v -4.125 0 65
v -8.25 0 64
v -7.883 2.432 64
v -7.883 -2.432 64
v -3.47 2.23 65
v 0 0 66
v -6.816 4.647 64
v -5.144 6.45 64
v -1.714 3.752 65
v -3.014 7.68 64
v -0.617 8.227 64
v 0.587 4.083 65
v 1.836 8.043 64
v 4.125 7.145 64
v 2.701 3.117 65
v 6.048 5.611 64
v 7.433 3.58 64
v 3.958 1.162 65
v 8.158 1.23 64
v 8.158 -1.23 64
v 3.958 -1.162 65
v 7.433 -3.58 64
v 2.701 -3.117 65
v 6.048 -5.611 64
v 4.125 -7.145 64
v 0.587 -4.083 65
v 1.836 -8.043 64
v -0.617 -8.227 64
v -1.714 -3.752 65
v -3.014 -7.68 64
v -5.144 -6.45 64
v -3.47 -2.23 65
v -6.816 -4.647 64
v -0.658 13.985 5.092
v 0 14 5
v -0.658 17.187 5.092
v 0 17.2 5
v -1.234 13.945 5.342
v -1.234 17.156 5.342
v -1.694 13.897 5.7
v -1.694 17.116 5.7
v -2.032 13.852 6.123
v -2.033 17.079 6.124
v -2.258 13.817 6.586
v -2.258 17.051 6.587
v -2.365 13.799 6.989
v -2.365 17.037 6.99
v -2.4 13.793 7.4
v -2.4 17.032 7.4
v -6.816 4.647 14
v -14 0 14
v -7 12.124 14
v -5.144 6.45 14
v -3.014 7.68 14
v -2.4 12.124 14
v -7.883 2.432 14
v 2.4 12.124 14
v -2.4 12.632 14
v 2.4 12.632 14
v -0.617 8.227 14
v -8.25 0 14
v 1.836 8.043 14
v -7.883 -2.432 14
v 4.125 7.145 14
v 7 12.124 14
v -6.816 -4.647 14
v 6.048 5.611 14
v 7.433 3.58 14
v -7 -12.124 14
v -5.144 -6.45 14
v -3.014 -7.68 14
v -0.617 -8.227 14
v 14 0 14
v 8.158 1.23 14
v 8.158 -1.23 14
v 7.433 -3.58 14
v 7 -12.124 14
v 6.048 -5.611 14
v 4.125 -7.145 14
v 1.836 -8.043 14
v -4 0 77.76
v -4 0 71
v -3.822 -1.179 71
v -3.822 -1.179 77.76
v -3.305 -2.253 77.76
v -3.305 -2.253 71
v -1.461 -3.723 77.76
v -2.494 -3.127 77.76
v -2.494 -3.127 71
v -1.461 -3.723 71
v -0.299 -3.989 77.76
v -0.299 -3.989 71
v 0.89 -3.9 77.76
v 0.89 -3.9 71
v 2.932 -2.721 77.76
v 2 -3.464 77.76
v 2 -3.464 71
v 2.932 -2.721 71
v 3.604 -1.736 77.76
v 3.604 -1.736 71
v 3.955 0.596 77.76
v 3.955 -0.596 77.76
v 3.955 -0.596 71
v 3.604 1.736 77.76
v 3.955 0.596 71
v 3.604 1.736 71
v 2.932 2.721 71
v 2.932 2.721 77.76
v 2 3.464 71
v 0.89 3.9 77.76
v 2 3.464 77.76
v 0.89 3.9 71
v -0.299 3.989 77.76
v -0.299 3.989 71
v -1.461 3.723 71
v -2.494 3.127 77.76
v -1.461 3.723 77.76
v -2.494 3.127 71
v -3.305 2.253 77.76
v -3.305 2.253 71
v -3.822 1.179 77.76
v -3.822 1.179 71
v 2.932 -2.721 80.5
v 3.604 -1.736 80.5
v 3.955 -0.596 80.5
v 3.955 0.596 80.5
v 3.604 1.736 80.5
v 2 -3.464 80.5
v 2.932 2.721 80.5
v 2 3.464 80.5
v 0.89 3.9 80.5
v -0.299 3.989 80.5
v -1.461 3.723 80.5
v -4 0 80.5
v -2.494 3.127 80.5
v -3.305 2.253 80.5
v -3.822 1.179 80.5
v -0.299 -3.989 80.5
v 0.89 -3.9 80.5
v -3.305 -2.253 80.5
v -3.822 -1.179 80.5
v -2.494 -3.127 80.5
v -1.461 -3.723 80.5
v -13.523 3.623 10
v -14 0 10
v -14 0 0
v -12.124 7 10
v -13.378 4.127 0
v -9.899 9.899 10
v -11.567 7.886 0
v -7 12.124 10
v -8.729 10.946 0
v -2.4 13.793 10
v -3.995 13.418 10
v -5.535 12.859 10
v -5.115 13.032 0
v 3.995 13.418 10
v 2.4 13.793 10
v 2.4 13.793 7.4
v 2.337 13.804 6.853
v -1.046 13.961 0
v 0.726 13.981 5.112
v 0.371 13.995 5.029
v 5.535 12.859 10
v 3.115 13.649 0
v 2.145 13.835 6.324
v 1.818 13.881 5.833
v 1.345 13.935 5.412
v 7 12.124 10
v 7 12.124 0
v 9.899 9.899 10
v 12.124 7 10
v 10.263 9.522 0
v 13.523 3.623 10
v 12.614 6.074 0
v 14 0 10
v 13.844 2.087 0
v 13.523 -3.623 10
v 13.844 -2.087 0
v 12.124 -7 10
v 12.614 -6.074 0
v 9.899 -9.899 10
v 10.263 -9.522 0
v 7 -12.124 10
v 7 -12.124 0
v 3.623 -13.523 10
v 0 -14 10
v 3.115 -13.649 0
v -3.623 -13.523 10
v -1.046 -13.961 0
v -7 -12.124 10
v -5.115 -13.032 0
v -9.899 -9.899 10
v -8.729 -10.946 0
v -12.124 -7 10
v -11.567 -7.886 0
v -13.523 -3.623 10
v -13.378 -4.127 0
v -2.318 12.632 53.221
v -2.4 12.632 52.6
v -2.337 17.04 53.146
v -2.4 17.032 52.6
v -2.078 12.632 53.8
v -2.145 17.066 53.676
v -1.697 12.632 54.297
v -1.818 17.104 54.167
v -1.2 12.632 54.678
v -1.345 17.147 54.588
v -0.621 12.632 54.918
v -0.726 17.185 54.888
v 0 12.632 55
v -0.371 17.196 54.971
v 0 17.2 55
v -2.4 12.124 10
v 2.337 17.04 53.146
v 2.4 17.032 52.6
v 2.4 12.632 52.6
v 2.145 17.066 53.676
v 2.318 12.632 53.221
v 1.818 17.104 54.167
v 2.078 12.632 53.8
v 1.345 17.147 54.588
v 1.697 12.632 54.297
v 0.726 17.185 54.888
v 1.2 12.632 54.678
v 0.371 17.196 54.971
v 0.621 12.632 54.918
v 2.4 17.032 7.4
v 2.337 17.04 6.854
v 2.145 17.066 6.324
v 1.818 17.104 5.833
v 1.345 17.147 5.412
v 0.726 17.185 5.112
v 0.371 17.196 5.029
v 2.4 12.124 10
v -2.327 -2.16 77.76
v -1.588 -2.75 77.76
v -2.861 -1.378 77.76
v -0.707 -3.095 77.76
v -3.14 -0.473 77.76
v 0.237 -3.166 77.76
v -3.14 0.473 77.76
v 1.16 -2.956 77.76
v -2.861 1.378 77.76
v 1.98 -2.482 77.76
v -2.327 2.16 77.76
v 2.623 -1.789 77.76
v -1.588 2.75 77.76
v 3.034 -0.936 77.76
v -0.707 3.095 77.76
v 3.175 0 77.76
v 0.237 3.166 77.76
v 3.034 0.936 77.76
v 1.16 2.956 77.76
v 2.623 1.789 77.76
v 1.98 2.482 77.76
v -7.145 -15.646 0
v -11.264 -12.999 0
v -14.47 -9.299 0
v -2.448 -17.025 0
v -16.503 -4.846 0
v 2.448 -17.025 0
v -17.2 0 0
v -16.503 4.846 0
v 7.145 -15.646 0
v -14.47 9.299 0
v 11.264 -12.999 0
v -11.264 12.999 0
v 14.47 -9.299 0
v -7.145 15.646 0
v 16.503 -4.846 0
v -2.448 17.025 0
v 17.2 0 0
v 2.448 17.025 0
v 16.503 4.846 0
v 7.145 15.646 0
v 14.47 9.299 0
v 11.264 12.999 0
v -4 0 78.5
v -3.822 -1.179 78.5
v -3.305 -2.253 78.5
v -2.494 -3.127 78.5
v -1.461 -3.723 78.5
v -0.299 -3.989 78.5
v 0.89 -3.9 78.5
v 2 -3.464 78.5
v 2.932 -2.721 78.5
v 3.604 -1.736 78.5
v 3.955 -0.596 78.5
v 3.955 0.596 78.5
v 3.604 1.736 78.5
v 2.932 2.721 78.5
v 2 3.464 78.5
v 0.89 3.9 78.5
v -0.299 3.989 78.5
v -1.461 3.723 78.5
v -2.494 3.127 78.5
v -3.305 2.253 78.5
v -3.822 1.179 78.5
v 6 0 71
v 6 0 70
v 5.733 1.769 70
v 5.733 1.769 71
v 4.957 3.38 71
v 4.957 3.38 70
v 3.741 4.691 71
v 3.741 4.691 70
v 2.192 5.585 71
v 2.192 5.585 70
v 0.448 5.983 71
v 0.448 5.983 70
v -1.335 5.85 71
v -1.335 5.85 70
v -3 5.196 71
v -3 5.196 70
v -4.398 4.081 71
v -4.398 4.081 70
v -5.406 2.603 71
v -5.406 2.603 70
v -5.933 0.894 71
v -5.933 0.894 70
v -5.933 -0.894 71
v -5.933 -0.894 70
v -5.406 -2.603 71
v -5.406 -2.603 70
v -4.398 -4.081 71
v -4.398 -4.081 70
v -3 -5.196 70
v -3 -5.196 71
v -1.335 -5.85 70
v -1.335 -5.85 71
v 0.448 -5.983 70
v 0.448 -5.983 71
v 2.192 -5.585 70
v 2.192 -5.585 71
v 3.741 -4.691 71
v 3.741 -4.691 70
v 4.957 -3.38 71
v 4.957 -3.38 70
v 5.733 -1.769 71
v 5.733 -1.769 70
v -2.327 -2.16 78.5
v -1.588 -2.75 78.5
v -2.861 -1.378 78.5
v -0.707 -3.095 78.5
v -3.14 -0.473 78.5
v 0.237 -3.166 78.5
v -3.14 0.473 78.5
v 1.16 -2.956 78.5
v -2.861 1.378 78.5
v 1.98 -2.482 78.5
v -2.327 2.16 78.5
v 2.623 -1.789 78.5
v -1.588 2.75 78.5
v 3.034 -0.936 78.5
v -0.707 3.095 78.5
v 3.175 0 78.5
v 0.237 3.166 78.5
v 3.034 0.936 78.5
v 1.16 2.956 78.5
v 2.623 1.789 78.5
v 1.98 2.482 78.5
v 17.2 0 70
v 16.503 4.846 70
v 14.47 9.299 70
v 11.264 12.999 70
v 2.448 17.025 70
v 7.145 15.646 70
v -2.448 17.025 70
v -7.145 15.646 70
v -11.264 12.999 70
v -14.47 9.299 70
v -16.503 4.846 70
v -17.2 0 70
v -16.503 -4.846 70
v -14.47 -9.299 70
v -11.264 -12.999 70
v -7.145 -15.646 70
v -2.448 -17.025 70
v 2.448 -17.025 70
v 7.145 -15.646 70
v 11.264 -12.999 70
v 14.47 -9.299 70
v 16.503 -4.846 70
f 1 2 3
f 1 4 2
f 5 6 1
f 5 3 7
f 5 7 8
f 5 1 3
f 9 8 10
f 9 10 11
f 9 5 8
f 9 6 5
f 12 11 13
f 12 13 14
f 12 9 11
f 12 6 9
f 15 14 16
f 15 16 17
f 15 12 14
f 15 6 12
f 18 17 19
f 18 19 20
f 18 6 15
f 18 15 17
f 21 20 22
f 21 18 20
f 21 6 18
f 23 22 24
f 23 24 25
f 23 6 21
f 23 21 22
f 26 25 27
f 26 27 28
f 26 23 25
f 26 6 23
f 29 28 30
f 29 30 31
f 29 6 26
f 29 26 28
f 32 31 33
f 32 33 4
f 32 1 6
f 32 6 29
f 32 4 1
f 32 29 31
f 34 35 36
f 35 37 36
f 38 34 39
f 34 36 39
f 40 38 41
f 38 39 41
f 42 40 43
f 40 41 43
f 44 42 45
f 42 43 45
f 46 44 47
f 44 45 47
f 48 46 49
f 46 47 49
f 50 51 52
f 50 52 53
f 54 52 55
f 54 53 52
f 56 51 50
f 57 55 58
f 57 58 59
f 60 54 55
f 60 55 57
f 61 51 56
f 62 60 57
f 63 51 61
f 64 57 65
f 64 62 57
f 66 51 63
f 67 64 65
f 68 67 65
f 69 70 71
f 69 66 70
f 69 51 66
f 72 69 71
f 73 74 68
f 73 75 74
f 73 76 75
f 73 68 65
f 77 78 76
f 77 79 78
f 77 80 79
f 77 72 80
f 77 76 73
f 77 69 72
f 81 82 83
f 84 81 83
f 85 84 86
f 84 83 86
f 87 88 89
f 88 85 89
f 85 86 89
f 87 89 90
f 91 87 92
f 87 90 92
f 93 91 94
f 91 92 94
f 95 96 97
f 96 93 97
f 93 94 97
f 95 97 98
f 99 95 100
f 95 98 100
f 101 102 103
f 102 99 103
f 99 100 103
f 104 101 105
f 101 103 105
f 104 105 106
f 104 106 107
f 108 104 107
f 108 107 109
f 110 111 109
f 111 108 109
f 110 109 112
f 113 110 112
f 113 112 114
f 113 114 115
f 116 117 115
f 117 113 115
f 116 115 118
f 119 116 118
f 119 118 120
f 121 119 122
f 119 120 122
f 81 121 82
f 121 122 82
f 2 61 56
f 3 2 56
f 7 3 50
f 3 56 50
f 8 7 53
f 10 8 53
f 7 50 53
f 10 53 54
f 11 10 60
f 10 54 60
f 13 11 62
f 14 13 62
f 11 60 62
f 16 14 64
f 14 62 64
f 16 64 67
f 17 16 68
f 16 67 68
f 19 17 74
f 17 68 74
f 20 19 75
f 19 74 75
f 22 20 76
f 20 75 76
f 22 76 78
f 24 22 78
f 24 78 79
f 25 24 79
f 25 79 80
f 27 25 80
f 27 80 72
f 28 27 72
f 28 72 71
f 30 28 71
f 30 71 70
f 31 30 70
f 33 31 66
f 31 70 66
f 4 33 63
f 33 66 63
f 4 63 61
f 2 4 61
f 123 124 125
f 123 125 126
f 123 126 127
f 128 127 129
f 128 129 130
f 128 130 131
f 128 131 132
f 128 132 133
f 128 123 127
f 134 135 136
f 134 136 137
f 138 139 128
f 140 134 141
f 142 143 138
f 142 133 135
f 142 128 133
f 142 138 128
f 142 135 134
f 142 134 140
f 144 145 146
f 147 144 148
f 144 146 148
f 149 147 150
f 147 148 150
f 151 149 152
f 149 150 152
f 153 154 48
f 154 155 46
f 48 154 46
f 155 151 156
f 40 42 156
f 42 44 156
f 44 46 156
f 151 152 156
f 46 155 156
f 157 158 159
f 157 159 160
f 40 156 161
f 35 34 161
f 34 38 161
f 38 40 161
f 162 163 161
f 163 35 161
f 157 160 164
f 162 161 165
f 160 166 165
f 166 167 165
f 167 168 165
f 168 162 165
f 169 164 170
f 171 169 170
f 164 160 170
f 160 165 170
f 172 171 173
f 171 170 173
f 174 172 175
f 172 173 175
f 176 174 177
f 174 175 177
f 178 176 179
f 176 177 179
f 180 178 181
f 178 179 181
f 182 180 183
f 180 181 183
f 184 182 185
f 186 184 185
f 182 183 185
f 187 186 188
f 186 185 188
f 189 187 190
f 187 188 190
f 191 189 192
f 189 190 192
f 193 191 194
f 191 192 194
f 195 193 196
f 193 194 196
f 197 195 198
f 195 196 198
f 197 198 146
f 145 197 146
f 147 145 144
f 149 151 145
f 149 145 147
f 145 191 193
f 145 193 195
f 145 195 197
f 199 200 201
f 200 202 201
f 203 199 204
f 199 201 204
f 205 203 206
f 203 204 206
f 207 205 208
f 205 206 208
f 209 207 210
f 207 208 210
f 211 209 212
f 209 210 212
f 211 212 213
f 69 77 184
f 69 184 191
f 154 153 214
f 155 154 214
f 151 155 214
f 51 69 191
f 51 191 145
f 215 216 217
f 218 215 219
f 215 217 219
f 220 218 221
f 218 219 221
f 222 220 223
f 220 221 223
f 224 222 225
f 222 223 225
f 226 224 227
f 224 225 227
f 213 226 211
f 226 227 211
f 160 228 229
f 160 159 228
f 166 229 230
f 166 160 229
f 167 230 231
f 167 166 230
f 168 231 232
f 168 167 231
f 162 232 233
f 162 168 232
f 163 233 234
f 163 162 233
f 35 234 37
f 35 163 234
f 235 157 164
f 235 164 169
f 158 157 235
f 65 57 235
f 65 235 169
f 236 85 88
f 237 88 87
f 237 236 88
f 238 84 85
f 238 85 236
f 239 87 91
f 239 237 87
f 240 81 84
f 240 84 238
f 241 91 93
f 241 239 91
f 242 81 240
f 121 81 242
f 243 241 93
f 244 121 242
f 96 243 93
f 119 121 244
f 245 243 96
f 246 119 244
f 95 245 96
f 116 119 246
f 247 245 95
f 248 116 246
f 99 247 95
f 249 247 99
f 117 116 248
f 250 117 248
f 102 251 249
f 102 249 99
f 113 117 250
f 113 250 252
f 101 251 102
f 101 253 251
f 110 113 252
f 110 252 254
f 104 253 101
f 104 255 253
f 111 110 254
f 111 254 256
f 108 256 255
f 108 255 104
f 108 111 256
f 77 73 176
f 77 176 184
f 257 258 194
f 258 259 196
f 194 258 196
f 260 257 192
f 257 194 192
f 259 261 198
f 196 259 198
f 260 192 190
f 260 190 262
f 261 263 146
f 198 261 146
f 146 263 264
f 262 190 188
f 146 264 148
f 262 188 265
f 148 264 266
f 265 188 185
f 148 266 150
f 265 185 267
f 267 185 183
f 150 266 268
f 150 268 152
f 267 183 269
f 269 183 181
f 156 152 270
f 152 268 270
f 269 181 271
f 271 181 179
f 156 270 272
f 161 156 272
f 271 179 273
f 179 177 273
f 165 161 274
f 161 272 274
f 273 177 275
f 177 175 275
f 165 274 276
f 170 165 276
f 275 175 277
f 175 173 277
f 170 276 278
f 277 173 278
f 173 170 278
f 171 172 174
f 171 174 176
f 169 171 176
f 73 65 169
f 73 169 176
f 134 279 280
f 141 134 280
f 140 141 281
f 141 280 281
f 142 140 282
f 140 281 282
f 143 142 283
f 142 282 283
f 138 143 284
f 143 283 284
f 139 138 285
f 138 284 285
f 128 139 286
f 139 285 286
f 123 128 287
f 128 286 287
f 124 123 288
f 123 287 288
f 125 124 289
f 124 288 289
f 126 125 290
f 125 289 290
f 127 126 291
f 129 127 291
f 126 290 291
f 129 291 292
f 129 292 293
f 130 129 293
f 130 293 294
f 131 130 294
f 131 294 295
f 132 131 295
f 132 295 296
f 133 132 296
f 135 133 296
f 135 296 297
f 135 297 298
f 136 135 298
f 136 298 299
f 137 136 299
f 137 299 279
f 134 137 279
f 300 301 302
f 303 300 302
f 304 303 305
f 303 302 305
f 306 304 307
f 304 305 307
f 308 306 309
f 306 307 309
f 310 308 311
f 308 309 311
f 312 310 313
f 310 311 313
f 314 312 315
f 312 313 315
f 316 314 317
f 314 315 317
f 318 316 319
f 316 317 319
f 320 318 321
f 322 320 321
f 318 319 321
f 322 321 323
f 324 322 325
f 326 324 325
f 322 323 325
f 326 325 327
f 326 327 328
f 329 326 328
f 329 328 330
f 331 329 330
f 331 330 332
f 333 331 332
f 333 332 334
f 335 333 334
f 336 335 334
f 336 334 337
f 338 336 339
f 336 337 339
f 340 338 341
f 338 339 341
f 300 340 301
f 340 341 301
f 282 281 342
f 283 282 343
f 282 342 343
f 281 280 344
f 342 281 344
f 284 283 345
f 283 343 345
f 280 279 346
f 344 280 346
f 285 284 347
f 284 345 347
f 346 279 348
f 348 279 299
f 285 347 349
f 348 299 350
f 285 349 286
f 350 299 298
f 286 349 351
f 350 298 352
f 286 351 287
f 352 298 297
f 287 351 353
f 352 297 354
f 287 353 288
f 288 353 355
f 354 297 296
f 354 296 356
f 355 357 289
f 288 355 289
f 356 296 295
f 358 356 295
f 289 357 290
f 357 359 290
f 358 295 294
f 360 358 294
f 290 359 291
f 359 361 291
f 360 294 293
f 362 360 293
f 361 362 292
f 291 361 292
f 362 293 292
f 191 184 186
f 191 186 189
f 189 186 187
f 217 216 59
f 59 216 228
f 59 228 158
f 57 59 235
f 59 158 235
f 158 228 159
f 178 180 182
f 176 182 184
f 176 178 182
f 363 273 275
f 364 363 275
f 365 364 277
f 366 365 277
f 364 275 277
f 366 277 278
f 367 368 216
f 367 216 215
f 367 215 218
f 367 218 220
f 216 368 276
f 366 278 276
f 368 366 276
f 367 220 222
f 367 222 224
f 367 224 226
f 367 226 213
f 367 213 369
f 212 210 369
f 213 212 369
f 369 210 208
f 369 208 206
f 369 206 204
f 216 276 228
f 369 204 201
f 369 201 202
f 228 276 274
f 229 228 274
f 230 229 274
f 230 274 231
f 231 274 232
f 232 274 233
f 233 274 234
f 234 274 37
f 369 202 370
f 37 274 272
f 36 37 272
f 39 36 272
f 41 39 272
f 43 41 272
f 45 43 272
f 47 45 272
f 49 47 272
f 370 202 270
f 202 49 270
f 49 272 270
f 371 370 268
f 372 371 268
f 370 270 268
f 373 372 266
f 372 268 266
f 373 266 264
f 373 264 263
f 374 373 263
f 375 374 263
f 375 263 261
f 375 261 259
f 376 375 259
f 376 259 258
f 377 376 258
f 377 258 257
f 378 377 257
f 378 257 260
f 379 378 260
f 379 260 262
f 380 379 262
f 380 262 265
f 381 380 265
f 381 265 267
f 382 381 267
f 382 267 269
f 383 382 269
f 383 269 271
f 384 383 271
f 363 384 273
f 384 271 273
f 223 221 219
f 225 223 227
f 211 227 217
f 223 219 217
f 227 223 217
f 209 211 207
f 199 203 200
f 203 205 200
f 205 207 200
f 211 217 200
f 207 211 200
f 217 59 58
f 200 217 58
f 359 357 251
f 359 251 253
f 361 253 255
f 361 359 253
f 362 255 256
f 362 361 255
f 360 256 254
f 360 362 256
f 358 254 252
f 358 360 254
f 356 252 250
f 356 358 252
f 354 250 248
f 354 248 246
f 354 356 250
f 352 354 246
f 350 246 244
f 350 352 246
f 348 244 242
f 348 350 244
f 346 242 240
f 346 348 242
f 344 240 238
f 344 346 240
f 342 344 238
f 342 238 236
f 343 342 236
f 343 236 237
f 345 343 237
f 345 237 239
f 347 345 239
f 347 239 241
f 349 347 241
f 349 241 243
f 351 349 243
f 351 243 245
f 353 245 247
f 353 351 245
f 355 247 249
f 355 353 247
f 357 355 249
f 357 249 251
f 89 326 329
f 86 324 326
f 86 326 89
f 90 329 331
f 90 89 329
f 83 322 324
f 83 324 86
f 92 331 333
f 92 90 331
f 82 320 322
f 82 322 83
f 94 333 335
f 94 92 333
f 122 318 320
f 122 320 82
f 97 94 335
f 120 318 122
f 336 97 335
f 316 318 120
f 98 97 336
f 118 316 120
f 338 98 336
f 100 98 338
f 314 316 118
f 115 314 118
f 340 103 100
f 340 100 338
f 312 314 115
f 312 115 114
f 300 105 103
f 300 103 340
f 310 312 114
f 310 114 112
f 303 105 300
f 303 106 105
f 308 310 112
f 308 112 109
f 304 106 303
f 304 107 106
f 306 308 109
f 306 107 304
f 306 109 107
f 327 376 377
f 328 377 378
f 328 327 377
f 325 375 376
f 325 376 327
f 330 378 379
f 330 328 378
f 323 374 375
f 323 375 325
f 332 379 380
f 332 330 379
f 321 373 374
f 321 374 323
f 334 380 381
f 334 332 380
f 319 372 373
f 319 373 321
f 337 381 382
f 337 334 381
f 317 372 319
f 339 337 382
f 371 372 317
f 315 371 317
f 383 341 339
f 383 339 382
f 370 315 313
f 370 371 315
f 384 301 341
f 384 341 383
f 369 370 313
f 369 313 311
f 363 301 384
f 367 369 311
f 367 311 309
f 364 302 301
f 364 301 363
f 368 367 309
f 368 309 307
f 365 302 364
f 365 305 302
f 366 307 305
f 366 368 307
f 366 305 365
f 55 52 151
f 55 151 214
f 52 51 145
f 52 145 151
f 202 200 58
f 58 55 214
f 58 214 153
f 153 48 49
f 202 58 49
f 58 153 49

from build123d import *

# Parameters (mm, degrees)
SKETCH1_R           = 17.2
BOSS_EXTRUDE1_DEPTH = 70
SKETCH2_R           = 14
CUT_EXTRUDE1_DEPTH  = 14
SKETCH3_R           = 8.25
CUT_EXTRUDE2_DEPTH  = 50
SKETCH5_R           = 4
BOSS_EXTRUDE2_DEPTH = 10.5
SKETCH9_R           = 16.379462193
BOSS_EXTRUDE4_DEPTH = 4
CUT_EXTRUDE3_START  = -5
CUT_EXTRUDE3_DEPTH  = 50
FILLET2_R           = 2.4
SKETCH7_R           = 6
BOSS_EXTRUDE3_DEPTH = 1
CUT_EXTRUDE4_START  = -2
SKETCH8_R           = 4.26334812
SKETCH8_R_2         = 3.175
CUT_EXTRUDE4_DEPTH  = 0.74
SKETCH10_W          = 4.8
SKETCH10_H          = 4
CUT_EXTRUDE5_DEPTH  = 10


with BuildPart() as part:
    # Sketch1 → Boss-Extrude1 (new body)
    with BuildSketch(Plane.XY):
        Circle(SKETCH1_R)
    extrude(amount=BOSS_EXTRUDE1_DEPTH)

    # Sketch2 → Cut-Extrude1 (cut)
    with BuildSketch(Plane(origin=(0, 0, 0), x_dir=(-1, 0, 0), z_dir=(0, 0, -1))):
        Circle(SKETCH2_R)
    extrude(amount=-CUT_EXTRUDE1_DEPTH, mode=Mode.SUBTRACT)

    # Sketch3 → Cut-Extrude2 (cut)
    with BuildSketch(Plane(origin=(0, 0, 14), x_dir=(-1, 0, 0), z_dir=(0, 0, -1))):
        Circle(SKETCH3_R)
    extrude(amount=-CUT_EXTRUDE2_DEPTH, mode=Mode.SUBTRACT)

    # Sketch4 → Cut-Revolve1 (revolve, cut)
    with BuildSketch(Plane(origin=(0, 0, 0), x_dir=(1, 0, 0), z_dir=(0, 1, 0)), mode=Mode.PRIVATE) as cut_revolve1_sk:
        Polygon((8.25, -64), (0, -66), (0, -64), align=None)
    revolve(cut_revolve1_sk.sketch.rotate(Axis((0, 0, 66), (0, 0, -1)), 180), axis=Axis((0, 0, 66), (0, 0, -1)), mode=Mode.SUBTRACT)

    # Sketch5 → Boss-Extrude2 (add)
    with BuildSketch(Plane.XY.offset(70)):
        with Locations(Location((0, 0, 0), (0, 0, 180))):
            Circle(SKETCH5_R)
    extrude(amount=BOSS_EXTRUDE2_DEPTH)

    # Sketch9 → Boss-Extrude4 (add)
    with BuildSketch(Plane(origin=(0, 0, 14), x_dir=(-1, 0, 0), z_dir=(0, 0, -1))):
        Circle(SKETCH9_R)
        Polygon((-14, 0), (-7, -12.124355653), (7, -12.124355653), (14, 0), (7, 12.124355653), (-7, 12.124355653), align=None, mode=Mode.SUBTRACT)
    extrude(amount=BOSS_EXTRUDE4_DEPTH)

    # Sketch6 → Cut-Extrude3 (cut)
    with BuildSketch(Plane(origin=(0, 0, 0), x_dir=(-1, 0, 0), z_dir=(0, 0, -1)).offset(CUT_EXTRUDE3_START)):
        with BuildLine():
            Line((-2.4, 17.031735085), (-2.4, 12.631735085))
            Line((-2.4, 12.631735085), (2.4, 12.631735085))
            Line((2.4, 12.631735085), (2.4, 17.031735085))
            ThreePointArc((2.4, 17.031735085), (0, 17.2), (-2.4, 17.031735085))
        make_face()
    extrude(amount=-CUT_EXTRUDE3_DEPTH, mode=Mode.SUBTRACT)

    # Fillet2
    fillet2_edges = [part.edges().sort_by_distance(p)[0] for p in [
        (-2.4, 14.831735085, 55),
        (2.4, 14.831735085, 55),
        (-2.4, 15.412243402, 5),
        (2.4, 15.412243402, 5),
    ]]
    fillet(fillet2_edges, radius=FILLET2_R - 0.0001)  # a hair under: the kernel refuses the full size

    # Sketch7 → Boss-Extrude3 (add)
    with BuildSketch(Plane.XY.offset(70)):
        Circle(SKETCH7_R)
    extrude(amount=BOSS_EXTRUDE3_DEPTH)

    # Sketch8 → Cut-Extrude4 (cut)
    with BuildSketch(Plane.XY.offset(80.5).offset(CUT_EXTRUDE4_START)):
        Circle(SKETCH8_R)
        Circle(SKETCH8_R_2, mode=Mode.SUBTRACT)
    extrude(amount=-CUT_EXTRUDE4_DEPTH, mode=Mode.SUBTRACT)

    # Sketch10 → Cut-Extrude5 (cut)
    with BuildSketch(Plane.XZ.offset(-12.124355653)):
        with Locations((0, 12)):
            Rectangle(SKETCH10_W, SKETCH10_H)
    extrude(amount=-CUT_EXTRUDE5_DEPTH, mode=Mode.SUBTRACT)


solid = part.part
